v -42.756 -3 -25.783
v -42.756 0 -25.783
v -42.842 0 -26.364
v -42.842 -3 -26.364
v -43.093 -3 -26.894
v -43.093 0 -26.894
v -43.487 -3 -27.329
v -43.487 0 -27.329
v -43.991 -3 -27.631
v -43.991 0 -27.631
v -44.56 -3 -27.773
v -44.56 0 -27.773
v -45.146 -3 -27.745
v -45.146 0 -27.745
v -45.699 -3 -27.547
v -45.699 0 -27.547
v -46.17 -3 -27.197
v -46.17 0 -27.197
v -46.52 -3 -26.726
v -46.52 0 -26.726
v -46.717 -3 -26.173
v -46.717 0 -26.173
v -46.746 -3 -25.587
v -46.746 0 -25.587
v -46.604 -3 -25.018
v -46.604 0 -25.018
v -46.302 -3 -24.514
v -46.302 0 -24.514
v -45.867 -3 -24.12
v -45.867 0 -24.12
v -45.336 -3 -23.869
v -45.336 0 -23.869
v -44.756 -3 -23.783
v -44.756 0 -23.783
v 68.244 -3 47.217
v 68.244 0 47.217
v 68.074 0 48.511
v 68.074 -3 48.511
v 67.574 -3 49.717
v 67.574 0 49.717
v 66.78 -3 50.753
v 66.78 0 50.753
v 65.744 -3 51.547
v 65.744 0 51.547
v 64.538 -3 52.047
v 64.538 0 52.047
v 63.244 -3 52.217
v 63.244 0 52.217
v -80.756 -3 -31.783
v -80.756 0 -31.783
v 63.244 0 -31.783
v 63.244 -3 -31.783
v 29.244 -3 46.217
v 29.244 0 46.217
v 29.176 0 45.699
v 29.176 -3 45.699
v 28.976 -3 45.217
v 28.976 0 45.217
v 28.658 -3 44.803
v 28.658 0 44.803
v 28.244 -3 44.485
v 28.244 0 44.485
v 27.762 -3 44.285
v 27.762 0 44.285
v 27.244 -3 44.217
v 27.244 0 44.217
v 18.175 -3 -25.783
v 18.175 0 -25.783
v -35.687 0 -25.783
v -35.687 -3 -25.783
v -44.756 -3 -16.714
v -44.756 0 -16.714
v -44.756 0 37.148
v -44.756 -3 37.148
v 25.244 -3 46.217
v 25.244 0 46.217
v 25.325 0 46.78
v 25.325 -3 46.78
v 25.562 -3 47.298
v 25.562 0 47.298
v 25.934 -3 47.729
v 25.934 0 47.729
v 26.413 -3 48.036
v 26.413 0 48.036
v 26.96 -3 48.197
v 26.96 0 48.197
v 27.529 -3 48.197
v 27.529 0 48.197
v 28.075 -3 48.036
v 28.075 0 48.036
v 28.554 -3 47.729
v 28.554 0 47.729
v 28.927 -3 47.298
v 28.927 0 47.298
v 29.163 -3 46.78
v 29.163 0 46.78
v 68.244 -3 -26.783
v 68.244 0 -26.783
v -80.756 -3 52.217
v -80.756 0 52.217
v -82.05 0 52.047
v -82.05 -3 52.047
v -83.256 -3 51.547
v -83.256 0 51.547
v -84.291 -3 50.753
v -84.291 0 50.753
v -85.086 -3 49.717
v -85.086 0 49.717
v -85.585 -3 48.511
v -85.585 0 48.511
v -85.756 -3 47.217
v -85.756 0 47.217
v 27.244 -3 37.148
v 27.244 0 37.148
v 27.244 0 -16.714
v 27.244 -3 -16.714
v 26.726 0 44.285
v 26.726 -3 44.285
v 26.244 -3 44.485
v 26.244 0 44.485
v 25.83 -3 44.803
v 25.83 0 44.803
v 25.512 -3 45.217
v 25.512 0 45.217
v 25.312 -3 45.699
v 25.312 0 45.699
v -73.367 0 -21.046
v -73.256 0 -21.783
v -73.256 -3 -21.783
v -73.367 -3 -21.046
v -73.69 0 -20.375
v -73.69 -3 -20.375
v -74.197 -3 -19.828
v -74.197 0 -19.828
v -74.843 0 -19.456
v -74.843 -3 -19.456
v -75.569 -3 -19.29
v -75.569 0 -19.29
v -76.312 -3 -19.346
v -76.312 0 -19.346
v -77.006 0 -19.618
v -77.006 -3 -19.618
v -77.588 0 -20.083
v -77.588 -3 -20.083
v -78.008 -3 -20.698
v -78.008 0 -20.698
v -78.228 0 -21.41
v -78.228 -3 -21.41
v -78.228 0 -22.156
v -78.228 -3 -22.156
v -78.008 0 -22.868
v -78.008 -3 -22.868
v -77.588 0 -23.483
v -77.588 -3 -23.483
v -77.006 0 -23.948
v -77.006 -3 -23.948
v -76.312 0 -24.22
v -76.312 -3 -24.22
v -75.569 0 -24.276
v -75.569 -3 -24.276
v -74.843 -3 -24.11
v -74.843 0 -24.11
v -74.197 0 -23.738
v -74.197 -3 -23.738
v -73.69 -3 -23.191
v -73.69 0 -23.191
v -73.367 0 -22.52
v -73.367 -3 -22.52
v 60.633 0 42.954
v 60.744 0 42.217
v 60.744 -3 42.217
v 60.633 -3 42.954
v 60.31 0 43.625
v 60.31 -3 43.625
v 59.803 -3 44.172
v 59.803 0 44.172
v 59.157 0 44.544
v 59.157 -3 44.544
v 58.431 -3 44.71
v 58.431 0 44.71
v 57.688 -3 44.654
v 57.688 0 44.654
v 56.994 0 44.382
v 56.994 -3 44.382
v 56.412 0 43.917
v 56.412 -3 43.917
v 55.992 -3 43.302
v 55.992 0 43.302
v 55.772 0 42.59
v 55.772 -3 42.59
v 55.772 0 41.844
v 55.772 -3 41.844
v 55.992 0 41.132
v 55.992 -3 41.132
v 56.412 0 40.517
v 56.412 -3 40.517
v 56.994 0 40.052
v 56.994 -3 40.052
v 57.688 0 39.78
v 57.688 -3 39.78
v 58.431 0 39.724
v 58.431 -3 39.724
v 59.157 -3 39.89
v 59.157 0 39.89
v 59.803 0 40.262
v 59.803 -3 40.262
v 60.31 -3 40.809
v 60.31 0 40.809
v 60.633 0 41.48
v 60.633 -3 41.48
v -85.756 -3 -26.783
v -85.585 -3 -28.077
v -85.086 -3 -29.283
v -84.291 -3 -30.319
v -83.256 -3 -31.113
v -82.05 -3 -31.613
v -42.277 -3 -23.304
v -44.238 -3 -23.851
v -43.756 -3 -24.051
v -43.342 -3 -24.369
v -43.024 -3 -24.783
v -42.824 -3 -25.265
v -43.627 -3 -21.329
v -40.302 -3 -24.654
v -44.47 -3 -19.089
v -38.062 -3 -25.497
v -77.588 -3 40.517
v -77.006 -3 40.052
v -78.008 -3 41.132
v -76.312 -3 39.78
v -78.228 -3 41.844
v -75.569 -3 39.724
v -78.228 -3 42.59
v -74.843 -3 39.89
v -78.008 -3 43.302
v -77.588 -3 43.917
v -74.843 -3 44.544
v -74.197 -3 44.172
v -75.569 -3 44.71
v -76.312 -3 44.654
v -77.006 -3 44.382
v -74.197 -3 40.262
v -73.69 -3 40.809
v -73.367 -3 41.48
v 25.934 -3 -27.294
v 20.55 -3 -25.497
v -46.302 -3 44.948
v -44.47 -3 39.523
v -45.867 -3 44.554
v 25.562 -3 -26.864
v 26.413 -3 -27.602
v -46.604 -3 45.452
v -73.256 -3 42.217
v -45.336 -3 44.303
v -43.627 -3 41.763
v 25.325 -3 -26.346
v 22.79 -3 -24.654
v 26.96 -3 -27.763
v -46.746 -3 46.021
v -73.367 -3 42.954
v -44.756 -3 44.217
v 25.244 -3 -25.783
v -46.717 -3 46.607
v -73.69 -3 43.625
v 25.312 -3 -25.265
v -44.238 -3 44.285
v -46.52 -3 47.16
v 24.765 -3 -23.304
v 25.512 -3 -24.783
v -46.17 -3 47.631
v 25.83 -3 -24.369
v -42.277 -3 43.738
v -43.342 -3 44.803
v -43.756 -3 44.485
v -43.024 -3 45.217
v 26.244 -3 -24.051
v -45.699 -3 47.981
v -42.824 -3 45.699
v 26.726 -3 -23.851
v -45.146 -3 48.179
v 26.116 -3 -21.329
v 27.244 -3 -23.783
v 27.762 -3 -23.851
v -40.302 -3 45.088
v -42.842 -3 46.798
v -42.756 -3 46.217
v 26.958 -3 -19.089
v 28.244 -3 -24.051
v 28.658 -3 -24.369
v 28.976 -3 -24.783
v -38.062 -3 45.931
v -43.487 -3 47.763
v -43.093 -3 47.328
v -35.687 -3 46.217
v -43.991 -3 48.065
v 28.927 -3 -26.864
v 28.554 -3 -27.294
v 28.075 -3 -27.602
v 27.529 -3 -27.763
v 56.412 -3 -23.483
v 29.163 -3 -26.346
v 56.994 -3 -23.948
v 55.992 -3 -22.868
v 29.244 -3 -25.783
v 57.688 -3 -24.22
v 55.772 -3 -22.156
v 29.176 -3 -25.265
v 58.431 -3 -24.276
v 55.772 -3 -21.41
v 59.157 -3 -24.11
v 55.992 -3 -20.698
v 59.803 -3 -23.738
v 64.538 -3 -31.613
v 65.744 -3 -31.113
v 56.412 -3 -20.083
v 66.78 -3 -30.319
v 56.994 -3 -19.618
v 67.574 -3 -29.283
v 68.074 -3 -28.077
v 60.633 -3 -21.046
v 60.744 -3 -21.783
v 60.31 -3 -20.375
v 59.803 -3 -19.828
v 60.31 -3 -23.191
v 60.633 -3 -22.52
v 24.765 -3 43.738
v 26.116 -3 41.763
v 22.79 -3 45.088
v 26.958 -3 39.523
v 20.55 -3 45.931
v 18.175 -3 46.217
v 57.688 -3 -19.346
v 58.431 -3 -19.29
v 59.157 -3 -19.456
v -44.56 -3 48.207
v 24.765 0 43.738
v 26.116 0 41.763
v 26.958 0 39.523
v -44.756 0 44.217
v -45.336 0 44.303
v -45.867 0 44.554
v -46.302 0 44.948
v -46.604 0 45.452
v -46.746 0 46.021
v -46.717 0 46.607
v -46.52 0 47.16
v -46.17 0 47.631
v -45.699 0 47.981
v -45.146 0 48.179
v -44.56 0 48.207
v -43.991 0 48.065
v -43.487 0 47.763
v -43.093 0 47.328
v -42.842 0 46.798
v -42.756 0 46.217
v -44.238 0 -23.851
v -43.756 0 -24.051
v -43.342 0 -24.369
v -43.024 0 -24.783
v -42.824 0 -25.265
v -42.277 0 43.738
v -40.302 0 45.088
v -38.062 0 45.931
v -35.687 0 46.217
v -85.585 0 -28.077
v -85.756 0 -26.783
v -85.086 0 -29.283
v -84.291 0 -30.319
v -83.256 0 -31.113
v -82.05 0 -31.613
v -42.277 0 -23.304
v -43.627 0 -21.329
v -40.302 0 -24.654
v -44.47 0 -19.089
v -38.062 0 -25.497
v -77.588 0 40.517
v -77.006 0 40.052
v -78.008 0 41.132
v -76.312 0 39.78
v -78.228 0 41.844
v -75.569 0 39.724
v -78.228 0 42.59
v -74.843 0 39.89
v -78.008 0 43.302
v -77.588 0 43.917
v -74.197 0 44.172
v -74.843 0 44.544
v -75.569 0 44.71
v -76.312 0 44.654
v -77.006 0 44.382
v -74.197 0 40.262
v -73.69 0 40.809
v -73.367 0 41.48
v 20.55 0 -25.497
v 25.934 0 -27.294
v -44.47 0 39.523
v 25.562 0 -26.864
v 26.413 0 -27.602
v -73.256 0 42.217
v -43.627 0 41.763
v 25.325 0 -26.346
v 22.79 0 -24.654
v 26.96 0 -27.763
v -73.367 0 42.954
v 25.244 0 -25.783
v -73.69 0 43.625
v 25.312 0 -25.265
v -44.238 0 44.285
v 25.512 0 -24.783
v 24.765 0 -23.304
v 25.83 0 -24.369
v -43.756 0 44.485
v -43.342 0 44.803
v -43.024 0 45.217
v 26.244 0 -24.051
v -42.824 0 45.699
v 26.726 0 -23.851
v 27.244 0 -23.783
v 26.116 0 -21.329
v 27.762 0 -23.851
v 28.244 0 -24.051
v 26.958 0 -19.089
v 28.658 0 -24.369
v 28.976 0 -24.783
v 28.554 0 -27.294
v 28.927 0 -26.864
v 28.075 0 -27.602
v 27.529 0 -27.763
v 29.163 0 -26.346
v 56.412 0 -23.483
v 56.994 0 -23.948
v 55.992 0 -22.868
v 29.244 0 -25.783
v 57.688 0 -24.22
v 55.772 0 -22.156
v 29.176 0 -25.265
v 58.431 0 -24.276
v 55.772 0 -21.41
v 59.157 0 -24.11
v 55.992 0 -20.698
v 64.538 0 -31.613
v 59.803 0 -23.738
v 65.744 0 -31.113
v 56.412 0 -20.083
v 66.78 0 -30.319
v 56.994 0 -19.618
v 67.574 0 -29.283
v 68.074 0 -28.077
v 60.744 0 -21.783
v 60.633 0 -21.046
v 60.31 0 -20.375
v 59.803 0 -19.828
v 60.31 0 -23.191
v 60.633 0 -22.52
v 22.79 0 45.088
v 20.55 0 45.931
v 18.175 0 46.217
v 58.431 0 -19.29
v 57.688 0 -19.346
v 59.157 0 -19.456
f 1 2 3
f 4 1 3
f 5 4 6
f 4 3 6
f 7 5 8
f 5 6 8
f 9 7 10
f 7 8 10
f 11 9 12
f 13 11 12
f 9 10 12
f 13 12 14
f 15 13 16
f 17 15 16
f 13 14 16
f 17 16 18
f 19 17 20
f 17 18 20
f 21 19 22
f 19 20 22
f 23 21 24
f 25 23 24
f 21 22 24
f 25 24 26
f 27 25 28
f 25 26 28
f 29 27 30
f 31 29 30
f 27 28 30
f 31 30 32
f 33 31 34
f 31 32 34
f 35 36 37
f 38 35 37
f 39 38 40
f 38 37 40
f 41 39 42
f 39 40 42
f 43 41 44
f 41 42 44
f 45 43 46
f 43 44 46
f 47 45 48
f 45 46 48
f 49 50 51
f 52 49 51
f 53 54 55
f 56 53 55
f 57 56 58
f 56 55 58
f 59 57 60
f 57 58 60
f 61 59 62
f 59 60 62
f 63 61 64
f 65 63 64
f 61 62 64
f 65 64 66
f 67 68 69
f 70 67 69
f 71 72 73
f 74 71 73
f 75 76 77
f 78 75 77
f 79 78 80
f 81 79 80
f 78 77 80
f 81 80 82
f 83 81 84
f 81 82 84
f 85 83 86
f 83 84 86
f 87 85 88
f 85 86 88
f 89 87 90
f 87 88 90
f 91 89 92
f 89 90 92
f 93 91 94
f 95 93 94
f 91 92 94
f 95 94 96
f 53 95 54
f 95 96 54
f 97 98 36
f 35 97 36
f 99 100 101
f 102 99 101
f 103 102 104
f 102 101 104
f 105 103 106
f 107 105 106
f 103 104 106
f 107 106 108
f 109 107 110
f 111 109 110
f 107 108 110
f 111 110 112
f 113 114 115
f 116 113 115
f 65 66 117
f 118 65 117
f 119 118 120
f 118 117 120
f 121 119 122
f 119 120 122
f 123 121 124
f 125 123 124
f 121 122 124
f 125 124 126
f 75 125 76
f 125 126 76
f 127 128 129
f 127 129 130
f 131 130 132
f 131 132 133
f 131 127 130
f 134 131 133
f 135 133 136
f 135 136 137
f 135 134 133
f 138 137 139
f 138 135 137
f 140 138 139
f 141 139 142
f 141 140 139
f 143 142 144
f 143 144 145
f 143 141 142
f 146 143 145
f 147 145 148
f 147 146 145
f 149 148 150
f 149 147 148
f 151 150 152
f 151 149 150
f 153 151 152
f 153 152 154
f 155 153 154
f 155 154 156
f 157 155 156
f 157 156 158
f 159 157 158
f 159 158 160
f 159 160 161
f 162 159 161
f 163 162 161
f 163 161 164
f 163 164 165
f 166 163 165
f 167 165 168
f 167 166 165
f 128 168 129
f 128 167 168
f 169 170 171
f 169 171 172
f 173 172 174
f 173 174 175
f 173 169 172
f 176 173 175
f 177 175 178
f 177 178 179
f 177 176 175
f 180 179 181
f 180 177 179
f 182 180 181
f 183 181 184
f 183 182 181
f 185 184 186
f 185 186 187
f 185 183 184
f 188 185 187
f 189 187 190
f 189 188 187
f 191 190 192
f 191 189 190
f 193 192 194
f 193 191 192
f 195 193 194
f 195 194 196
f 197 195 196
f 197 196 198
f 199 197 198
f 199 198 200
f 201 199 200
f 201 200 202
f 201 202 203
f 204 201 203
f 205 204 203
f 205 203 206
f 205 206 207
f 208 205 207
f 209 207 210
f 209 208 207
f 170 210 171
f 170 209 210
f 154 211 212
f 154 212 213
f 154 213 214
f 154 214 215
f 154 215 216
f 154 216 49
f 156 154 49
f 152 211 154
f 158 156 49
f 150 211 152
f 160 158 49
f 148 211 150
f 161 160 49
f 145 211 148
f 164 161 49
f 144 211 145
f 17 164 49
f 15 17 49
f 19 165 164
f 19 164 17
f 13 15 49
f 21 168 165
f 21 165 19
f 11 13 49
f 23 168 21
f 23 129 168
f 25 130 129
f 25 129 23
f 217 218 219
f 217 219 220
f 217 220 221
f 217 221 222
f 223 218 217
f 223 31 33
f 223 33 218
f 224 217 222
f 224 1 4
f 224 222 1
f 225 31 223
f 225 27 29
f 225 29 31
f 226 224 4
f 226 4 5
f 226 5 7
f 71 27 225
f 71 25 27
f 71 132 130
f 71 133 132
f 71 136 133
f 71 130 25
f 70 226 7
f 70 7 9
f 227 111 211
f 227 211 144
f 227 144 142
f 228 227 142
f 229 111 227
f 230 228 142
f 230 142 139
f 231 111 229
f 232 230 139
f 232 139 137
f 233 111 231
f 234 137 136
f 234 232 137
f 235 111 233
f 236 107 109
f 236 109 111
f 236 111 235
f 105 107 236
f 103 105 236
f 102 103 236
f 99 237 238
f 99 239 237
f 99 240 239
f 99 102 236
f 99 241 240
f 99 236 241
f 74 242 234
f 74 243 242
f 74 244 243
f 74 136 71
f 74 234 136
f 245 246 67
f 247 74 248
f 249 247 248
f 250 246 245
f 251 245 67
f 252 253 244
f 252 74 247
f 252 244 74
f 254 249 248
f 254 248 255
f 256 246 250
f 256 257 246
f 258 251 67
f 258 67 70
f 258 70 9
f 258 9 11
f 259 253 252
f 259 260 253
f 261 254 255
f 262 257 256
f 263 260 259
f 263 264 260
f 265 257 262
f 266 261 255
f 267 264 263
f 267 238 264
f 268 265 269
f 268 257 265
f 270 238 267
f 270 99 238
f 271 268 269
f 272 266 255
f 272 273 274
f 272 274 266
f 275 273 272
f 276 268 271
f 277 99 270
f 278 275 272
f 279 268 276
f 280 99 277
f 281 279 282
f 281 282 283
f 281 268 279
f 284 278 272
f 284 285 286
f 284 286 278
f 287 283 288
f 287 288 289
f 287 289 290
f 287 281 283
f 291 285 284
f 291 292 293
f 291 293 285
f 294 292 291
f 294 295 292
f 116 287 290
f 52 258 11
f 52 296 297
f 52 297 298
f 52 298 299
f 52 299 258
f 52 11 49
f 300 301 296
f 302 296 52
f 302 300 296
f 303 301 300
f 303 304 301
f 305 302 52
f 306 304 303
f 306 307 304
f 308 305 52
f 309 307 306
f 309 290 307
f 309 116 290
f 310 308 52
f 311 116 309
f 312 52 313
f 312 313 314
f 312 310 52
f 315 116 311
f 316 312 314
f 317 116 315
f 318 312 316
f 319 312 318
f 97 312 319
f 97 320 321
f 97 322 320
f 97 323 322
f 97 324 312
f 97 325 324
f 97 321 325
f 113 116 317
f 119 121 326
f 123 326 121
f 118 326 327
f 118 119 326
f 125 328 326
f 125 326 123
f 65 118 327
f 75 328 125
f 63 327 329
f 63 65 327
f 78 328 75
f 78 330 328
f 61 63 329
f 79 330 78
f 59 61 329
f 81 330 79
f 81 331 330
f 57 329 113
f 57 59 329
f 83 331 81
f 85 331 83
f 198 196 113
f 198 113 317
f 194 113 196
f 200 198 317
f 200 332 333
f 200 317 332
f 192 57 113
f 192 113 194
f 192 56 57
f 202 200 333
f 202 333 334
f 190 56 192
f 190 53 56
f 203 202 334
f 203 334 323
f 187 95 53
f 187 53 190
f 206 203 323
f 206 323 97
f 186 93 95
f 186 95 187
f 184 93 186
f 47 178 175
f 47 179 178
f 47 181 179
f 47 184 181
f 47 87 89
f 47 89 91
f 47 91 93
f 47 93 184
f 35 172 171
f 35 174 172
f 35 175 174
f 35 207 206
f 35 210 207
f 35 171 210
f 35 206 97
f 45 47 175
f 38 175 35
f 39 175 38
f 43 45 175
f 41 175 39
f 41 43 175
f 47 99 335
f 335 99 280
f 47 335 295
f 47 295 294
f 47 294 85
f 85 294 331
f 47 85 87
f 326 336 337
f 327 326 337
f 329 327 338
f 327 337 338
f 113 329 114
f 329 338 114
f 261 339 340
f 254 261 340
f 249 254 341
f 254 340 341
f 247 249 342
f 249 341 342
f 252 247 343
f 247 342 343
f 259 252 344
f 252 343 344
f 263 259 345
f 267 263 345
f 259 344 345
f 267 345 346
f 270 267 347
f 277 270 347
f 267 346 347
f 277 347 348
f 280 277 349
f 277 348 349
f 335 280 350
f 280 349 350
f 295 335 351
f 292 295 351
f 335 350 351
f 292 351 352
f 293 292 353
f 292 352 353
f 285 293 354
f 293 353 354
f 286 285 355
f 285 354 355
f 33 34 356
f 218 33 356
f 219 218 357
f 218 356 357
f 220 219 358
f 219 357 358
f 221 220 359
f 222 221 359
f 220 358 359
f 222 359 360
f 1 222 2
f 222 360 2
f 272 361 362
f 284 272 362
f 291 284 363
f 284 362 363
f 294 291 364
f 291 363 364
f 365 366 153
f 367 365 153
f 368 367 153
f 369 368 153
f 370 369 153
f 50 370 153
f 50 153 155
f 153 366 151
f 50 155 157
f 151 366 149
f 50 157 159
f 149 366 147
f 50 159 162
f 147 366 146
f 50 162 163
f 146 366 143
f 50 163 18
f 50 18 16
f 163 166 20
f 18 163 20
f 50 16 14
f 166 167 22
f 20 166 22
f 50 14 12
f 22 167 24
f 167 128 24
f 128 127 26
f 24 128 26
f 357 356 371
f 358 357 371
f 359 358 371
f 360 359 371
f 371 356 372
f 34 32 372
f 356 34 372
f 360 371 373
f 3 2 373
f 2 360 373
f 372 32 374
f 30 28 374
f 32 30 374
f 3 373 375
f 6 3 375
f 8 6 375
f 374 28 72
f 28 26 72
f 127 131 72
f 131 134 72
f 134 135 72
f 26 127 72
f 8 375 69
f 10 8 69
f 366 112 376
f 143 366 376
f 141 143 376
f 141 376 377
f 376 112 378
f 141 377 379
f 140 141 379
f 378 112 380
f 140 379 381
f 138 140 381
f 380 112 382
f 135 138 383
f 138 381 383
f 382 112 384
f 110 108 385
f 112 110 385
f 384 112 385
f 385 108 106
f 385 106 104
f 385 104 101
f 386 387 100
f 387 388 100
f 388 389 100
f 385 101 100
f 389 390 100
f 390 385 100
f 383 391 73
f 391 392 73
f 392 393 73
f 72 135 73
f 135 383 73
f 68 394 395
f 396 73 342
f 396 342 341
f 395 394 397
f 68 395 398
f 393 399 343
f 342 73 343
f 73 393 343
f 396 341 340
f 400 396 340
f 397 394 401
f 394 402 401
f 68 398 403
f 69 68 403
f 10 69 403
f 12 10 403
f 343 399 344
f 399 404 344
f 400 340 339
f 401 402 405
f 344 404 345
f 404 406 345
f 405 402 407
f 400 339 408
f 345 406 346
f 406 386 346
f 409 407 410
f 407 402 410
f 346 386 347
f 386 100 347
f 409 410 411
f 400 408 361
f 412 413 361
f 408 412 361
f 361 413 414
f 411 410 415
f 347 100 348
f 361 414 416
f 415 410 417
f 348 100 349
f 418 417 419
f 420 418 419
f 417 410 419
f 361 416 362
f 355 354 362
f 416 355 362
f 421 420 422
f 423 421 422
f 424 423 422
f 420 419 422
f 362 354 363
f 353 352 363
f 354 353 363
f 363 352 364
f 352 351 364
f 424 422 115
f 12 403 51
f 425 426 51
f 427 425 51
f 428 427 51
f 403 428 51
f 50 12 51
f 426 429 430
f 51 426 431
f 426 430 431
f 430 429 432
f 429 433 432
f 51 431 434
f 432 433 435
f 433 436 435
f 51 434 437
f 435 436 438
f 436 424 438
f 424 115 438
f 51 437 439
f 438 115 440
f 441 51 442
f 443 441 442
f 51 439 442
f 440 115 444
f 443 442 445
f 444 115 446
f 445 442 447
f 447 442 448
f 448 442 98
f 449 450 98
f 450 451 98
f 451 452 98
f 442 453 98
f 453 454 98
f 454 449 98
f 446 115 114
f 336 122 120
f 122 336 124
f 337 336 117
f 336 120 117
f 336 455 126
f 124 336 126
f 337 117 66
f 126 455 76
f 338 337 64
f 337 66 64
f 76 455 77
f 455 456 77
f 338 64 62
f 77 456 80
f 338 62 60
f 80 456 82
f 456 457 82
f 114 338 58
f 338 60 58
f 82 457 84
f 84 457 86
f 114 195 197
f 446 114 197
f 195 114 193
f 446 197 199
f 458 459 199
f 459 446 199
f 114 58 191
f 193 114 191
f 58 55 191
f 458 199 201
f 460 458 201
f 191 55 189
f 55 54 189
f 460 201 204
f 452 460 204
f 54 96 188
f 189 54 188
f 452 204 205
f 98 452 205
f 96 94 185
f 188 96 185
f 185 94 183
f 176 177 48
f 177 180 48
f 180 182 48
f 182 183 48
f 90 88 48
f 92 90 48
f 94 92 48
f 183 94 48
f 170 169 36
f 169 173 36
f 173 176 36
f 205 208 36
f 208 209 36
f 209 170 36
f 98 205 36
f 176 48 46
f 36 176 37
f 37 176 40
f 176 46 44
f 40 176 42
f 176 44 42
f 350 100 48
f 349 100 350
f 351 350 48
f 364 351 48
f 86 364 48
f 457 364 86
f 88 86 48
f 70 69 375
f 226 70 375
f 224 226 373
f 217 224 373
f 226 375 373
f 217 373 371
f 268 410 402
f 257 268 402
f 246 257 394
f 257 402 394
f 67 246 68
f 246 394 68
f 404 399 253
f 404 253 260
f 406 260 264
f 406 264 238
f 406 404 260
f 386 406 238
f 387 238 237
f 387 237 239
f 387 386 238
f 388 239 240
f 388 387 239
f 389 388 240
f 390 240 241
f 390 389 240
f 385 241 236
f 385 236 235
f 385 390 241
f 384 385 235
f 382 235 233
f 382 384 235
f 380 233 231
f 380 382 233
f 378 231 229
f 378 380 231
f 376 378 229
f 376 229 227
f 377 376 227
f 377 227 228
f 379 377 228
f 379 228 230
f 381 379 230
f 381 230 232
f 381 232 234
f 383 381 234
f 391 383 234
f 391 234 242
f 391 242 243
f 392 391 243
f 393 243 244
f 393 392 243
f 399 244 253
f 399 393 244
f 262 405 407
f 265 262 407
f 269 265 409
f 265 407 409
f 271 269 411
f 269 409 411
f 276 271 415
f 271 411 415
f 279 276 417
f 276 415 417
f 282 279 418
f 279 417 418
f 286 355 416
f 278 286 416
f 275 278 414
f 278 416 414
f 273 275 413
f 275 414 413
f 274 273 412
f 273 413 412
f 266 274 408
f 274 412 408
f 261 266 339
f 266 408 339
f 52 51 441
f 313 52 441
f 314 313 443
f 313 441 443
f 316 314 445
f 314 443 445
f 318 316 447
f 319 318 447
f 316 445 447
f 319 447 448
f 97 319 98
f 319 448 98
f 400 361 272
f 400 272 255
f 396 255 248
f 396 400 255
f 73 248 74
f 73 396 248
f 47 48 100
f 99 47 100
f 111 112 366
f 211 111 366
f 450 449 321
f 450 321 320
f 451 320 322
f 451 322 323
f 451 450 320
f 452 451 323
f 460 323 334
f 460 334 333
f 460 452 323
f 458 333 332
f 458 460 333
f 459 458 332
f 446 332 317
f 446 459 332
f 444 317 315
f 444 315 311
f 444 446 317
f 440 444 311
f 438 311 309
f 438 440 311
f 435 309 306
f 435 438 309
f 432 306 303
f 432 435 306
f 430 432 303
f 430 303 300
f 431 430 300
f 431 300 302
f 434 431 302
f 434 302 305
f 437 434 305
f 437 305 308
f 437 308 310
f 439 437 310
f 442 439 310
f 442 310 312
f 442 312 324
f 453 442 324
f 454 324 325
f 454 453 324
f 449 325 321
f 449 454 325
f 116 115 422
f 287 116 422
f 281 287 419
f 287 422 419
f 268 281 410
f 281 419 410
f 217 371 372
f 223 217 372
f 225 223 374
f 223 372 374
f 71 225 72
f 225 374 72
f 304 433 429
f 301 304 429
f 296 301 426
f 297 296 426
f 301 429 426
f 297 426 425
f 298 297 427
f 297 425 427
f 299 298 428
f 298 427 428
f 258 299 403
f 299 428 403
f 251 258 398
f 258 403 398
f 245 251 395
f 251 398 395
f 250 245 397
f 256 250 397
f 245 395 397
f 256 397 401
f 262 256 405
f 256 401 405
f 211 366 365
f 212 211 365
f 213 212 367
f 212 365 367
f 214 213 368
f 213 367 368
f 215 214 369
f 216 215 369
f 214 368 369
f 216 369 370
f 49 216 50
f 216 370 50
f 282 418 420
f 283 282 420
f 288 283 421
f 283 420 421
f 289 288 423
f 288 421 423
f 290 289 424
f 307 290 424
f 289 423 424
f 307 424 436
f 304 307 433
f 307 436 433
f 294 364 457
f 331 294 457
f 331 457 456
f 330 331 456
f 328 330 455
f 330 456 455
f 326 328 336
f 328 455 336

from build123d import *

# Parameters (mm, degrees)
F0_R        = 2.5
F1_DEPTH    = 3
F2_T1_DEPTH = 3


# Not quite as in the source:
# - a fillet or chamfer that OpenCascade refuses, or shapes differently, is made with other operations: its cross-section is extruded or revolved along the edge and cut away or added


with BuildPart() as f1:
    # F0 (on Front) → F1 (new body)
    with BuildSketch(Plane.XZ):
        with BuildLine():
            Line((-85.7558696013, 2.2170336112), (-85.7558696013, -11.7829663888))
            Line((-85.7558696013, -11.7829663888), (-85.7558696013, -26.7829663888))
            ThreePointArc((-85.7558696013, -26.7829663888), (-84.2914035073, -30.3185002947), (-80.7558696013, -31.7829663888))
            Line((-80.7558696013, -31.7829663888), (-70.7558696013, -31.7829663888))
            Line((-70.7558696013, -31.7829663888), (53.2441303987, -31.7829663888))
            Line((53.2441303987, -31.7829663888), (63.2441303987, -31.7829663888))
            ThreePointArc((63.2441303987, -31.7829663888), (66.7796643046, -30.3185002947), (68.2441303987, -26.7829663888))
            Line((68.2441303987, -26.7829663888), (68.2441303987, -17.7829663888))
            Line((68.2441303987, -17.7829663888), (68.2441303987, -11.7829663888))
            Line((68.2441303987, -11.7829663888), (68.2441303987, -2.7829663888))
            Line((68.2441303987, -2.7829663888), (68.2441303987, 2.2170336112))
            Line((68.2441303987, 2.2170336112), (68.2441303987, 32.2170336112))
            Line((68.2441303987, 32.2170336112), (68.2441303987, 47.2170336112))
            ThreePointArc((68.2441303987, 47.2170336112), (66.7796643046, 50.7525675171), (63.2441303987, 52.2170336112))
            Line((63.2441303987, 52.2170336112), (53.2441303987, 52.2170336112))
            Line((53.2441303987, 52.2170336112), (-70.7558696013, 52.2170336112))
            Line((-70.7558696013, 52.2170336112), (-80.7558696013, 52.2170336112))
            ThreePointArc((-80.7558696013, 52.2170336112), (-84.2914035073, 50.7525675171), (-85.7558696013, 47.2170336112))
            Line((-85.7558696013, 47.2170336112), (-85.7558696013, 32.2170336112))
            Line((-85.7558696013, 32.2170336112), (-85.7558696013, 2.2170336112))
        make_face()
        with Locations((-75.7558696013, -21.7829663888)):
            Circle(F0_R, mode=Mode.SUBTRACT)
        with BuildLine():
            ThreePointArc((-44.7558696013, 42.7170336112), (-47.2307433355, 48.6919073454), (-41.2558696013, 46.2170336112))
            Line((-41.2558696013, 46.2170336112), (23.7441303987, 46.2170336112))
            ThreePointArc((23.7441303987, 46.2170336112), (27.2441303987, 49.7170336112), (30.7441303987, 46.2170336112))
            ThreePointArc((30.7441303987, 46.2170336112), (29.7190041328, 43.7421598771), (27.2441303987, 42.7170336112))
            Line((27.2441303987, 42.7170336112), (27.2441303987, -22.2829663888))
            ThreePointArc((27.2441303987, -22.2829663888), (29.7190041328, -23.3080926546), (30.7441303987, -25.7829663888))
            ThreePointArc((30.7441303987, -25.7829663888), (27.2441303987, -29.2829663888), (23.7441303987, -25.7829663888))
            Line((23.7441303987, -25.7829663888), (-41.2558696013, -25.7829663888))
            ThreePointArc((-41.2558696013, -25.7829663888), (-47.2307433355, -28.2578401229), (-44.7558696013, -22.2829663888))
            Line((-44.7558696013, -22.2829663888), (-44.7558696013, 42.7170336112))
        make_face(mode=Mode.SUBTRACT)
        with Locations((58.2441303987, -21.7829663888)):
            Circle(F0_R, mode=Mode.SUBTRACT)
        with Locations((-75.7558696013, 42.2170336112)):
            Circle(F0_R, mode=Mode.SUBTRACT)
        with Locations((58.2441303987, 42.2170336112)):
            Circle(F0_R, mode=Mode.SUBTRACT)
        with BuildLine():
            ThreePointArc((-44.7558696013, 44.2170336112), (-46.1700831637, 47.6312471736), (-42.7558696013, 46.2170336112))
            Line((-42.7558696013, 46.2170336112), (-41.2558696013, 46.2170336112))
            ThreePointArc((-41.2558696013, 46.2170336112), (-47.2307433355, 48.6919073454), (-44.7558696013, 42.7170336112))
            Line((-44.7558696013, 42.7170336112), (-44.7558696013, 44.2170336112))
        make_face()
        with BuildLine():
            Line((-41.2558696013, 46.2170336112), (-42.7558696013, 46.2170336112))
            ThreePointArc((-42.7558696013, 46.2170336112), (-43.341656039, 44.8028200488), (-44.7558696013, 44.2170336112))
            Line((-44.7558696013, 44.2170336112), (-44.7558696013, 42.7170336112))
            ThreePointArc((-44.7558696013, 42.7170336112), (-42.2809958672, 43.7421598771), (-41.2558696013, 46.2170336112))
        make_face()
        with BuildLine():
            Line((-44.7558696013, -23.7829663888), (-44.7558696013, -22.2829663888))
            ThreePointArc((-44.7558696013, -22.2829663888), (-47.2307433355, -28.2578401229), (-41.2558696013, -25.7829663888))
            Line((-41.2558696013, -25.7829663888), (-42.7558696013, -25.7829663888))
            ThreePointArc((-42.7558696013, -25.7829663888), (-46.1700831637, -27.1971799512), (-44.7558696013, -23.7829663888))
        make_face()
        with BuildLine():
            ThreePointArc((-41.2558696013, -25.7829663888), (-42.2809958672, -23.3080926546), (-44.7558696013, -22.2829663888))
            Line((-44.7558696013, -22.2829663888), (-44.7558696013, -23.7829663888))
            ThreePointArc((-44.7558696013, -23.7829663888), (-43.341656039, -24.3687528264), (-42.7558696013, -25.7829663888))
            Line((-42.7558696013, -25.7829663888), (-41.2558696013, -25.7829663888))
        make_face()
        with BuildLine():
            Line((27.2441303987, -23.7829663888), (27.2441303987, -22.2829663888))
            ThreePointArc((27.2441303987, -22.2829663888), (24.7692566645, -23.3080926546), (23.7441303987, -25.7829663888))
            Line((23.7441303987, -25.7829663888), (25.2441303987, -25.7829663888))
            ThreePointArc((25.2441303987, -25.7829663888), (25.8299168363, -24.3687528264), (27.2441303987, -23.7829663888))
        make_face()
        with BuildLine():
            ThreePointArc((30.7441303987, -25.7829663888), (29.7190041328, -23.3080926546), (27.2441303987, -22.2829663888))
            Line((27.2441303987, -22.2829663888), (27.2441303987, -23.7829663888))
            ThreePointArc((27.2441303987, -23.7829663888), (28.658343961, -24.3687528264), (29.2441303987, -25.7829663888))
            ThreePointArc((29.2441303987, -25.7829663888), (27.2441303987, -27.7829663888), (25.2441303987, -25.7829663888))
            Line((25.2441303987, -25.7829663888), (23.7441303987, -25.7829663888))
            ThreePointArc((23.7441303987, -25.7829663888), (27.2441303987, -29.2829663888), (30.7441303987, -25.7829663888))
        make_face()
        with BuildLine():
            Line((25.2441303987, 46.2170336112), (23.7441303987, 46.2170336112))
            ThreePointArc((23.7441303987, 46.2170336112), (24.7692566645, 43.7421598771), (27.2441303987, 42.7170336112))
            Line((27.2441303987, 42.7170336112), (27.2441303987, 44.2170336112))
            ThreePointArc((27.2441303987, 44.2170336112), (25.8299168363, 44.8028200488), (25.2441303987, 46.2170336112))
        make_face()
        with BuildLine():
            ThreePointArc((30.7441303987, 46.2170336112), (27.2441303987, 49.7170336112), (23.7441303987, 46.2170336112))
            Line((23.7441303987, 46.2170336112), (25.2441303987, 46.2170336112))
            ThreePointArc((25.2441303987, 46.2170336112), (27.2441303987, 48.2170336112), (29.2441303987, 46.2170336112))
            ThreePointArc((29.2441303987, 46.2170336112), (28.658343961, 44.8028200488), (27.2441303987, 44.2170336112))
            Line((27.2441303987, 44.2170336112), (27.2441303987, 42.7170336112))
            ThreePointArc((27.2441303987, 42.7170336112), (29.7190041328, 43.7421598771), (30.7441303987, 46.2170336112))
        make_face()
    extrude(amount=F1_DEPTH)

    # F2: fillet of radius 10 on 8 edges, made by hand

    # F2_s2 → F2_t1 (join)
    with BuildSketch(Plane.XZ):
        with BuildLine():
            ThreePointArc((24.6515378061, 43.8657650921), (26.5734946341, 40.7482665367), (27.2441303987, 37.1478550376))
            Line((27.2441303987, 37.1478550376), (27.2441303987, 42.7170336112))
            ThreePointArc((27.2441303987, 42.7170336112), (25.8262869335, 43.0170773758), (24.6515378061, 43.8657650921))
        make_face()
        with BuildLine():
            ThreePointArc((18.1749518251, 46.2170336112), (21.7753633242, 45.5463978466), (24.8928618796, 43.6244410186))
            ThreePointArc((24.8928618796, 43.6244410186), (24.0441741633, 44.7991901461), (23.7441303987, 46.2170336112))
            Line((23.7441303987, 46.2170336112), (18.1749518251, 46.2170336112))
        make_face()
        with BuildLine():
            ThreePointArc((-42.4046010823, 43.6244410186), (-39.2871025268, 45.5463978466), (-35.6866910277, 46.2170336112))
            Line((-35.6866910277, 46.2170336112), (-41.2558696013, 46.2170336112))
            ThreePointArc((-41.2558696013, 46.2170336112), (-41.5559133659, 44.7991901461), (-42.4046010823, 43.6244410186))
        make_face()
        with BuildLine():
            ThreePointArc((-42.1632770087, 43.8657650921), (-44.0852338368, 40.7482665367), (-44.7558696013, 37.1478550376))
            Line((-44.7558696013, 37.1478550376), (-44.7558696013, 42.7170336112))
            ThreePointArc((-44.7558696013, 42.7170336112), (-43.3380261362, 43.0170773758), (-42.1632770087, 43.8657650921))
        make_face()
        with BuildLine():
            ThreePointArc((-42.1632770087, -23.4316978697), (-44.0852338368, -20.3141993143), (-44.7558696013, -16.7137878152))
            Line((-44.7558696013, -16.7137878152), (-44.7558696013, -22.2829663888))
            ThreePointArc((-44.7558696013, -22.2829663888), (-43.3380261362, -22.5830101534), (-42.1632770087, -23.4316978697))
        make_face()
        with BuildLine():
            ThreePointArc((-35.6866910277, -25.7829663888), (-39.2871025268, -25.1123306242), (-42.4046010823, -23.1903737962))
            ThreePointArc((-42.4046010823, -23.1903737962), (-41.5559133659, -24.3651229237), (-41.2558696013, -25.7829663888))
            Line((-41.2558696013, -25.7829663888), (-35.6866910277, -25.7829663888))
        make_face()
        with BuildLine():
            ThreePointArc((27.2441303987, -16.7137878152), (26.5734946341, -20.3141993143), (24.6515378061, -23.4316978697))
            ThreePointArc((24.6515378061, -23.4316978697), (25.8262869335, -22.5830101534), (27.2441303987, -22.2829663888))
            Line((27.2441303987, -22.2829663888), (27.2441303987, -16.7137878152))
        make_face()
        with BuildLine():
            ThreePointArc((24.8928618796, -23.1903737962), (21.7753633242, -25.1123306242), (18.1749518251, -25.7829663888))
            Line((18.1749518251, -25.7829663888), (23.7441303987, -25.7829663888))
            ThreePointArc((23.7441303987, -25.7829663888), (24.0441741633, -24.3651229237), (24.8928618796, -23.1903737962))
        make_face()
    extrude(amount=F2_T1_DEPTH)


solid = f1.part
